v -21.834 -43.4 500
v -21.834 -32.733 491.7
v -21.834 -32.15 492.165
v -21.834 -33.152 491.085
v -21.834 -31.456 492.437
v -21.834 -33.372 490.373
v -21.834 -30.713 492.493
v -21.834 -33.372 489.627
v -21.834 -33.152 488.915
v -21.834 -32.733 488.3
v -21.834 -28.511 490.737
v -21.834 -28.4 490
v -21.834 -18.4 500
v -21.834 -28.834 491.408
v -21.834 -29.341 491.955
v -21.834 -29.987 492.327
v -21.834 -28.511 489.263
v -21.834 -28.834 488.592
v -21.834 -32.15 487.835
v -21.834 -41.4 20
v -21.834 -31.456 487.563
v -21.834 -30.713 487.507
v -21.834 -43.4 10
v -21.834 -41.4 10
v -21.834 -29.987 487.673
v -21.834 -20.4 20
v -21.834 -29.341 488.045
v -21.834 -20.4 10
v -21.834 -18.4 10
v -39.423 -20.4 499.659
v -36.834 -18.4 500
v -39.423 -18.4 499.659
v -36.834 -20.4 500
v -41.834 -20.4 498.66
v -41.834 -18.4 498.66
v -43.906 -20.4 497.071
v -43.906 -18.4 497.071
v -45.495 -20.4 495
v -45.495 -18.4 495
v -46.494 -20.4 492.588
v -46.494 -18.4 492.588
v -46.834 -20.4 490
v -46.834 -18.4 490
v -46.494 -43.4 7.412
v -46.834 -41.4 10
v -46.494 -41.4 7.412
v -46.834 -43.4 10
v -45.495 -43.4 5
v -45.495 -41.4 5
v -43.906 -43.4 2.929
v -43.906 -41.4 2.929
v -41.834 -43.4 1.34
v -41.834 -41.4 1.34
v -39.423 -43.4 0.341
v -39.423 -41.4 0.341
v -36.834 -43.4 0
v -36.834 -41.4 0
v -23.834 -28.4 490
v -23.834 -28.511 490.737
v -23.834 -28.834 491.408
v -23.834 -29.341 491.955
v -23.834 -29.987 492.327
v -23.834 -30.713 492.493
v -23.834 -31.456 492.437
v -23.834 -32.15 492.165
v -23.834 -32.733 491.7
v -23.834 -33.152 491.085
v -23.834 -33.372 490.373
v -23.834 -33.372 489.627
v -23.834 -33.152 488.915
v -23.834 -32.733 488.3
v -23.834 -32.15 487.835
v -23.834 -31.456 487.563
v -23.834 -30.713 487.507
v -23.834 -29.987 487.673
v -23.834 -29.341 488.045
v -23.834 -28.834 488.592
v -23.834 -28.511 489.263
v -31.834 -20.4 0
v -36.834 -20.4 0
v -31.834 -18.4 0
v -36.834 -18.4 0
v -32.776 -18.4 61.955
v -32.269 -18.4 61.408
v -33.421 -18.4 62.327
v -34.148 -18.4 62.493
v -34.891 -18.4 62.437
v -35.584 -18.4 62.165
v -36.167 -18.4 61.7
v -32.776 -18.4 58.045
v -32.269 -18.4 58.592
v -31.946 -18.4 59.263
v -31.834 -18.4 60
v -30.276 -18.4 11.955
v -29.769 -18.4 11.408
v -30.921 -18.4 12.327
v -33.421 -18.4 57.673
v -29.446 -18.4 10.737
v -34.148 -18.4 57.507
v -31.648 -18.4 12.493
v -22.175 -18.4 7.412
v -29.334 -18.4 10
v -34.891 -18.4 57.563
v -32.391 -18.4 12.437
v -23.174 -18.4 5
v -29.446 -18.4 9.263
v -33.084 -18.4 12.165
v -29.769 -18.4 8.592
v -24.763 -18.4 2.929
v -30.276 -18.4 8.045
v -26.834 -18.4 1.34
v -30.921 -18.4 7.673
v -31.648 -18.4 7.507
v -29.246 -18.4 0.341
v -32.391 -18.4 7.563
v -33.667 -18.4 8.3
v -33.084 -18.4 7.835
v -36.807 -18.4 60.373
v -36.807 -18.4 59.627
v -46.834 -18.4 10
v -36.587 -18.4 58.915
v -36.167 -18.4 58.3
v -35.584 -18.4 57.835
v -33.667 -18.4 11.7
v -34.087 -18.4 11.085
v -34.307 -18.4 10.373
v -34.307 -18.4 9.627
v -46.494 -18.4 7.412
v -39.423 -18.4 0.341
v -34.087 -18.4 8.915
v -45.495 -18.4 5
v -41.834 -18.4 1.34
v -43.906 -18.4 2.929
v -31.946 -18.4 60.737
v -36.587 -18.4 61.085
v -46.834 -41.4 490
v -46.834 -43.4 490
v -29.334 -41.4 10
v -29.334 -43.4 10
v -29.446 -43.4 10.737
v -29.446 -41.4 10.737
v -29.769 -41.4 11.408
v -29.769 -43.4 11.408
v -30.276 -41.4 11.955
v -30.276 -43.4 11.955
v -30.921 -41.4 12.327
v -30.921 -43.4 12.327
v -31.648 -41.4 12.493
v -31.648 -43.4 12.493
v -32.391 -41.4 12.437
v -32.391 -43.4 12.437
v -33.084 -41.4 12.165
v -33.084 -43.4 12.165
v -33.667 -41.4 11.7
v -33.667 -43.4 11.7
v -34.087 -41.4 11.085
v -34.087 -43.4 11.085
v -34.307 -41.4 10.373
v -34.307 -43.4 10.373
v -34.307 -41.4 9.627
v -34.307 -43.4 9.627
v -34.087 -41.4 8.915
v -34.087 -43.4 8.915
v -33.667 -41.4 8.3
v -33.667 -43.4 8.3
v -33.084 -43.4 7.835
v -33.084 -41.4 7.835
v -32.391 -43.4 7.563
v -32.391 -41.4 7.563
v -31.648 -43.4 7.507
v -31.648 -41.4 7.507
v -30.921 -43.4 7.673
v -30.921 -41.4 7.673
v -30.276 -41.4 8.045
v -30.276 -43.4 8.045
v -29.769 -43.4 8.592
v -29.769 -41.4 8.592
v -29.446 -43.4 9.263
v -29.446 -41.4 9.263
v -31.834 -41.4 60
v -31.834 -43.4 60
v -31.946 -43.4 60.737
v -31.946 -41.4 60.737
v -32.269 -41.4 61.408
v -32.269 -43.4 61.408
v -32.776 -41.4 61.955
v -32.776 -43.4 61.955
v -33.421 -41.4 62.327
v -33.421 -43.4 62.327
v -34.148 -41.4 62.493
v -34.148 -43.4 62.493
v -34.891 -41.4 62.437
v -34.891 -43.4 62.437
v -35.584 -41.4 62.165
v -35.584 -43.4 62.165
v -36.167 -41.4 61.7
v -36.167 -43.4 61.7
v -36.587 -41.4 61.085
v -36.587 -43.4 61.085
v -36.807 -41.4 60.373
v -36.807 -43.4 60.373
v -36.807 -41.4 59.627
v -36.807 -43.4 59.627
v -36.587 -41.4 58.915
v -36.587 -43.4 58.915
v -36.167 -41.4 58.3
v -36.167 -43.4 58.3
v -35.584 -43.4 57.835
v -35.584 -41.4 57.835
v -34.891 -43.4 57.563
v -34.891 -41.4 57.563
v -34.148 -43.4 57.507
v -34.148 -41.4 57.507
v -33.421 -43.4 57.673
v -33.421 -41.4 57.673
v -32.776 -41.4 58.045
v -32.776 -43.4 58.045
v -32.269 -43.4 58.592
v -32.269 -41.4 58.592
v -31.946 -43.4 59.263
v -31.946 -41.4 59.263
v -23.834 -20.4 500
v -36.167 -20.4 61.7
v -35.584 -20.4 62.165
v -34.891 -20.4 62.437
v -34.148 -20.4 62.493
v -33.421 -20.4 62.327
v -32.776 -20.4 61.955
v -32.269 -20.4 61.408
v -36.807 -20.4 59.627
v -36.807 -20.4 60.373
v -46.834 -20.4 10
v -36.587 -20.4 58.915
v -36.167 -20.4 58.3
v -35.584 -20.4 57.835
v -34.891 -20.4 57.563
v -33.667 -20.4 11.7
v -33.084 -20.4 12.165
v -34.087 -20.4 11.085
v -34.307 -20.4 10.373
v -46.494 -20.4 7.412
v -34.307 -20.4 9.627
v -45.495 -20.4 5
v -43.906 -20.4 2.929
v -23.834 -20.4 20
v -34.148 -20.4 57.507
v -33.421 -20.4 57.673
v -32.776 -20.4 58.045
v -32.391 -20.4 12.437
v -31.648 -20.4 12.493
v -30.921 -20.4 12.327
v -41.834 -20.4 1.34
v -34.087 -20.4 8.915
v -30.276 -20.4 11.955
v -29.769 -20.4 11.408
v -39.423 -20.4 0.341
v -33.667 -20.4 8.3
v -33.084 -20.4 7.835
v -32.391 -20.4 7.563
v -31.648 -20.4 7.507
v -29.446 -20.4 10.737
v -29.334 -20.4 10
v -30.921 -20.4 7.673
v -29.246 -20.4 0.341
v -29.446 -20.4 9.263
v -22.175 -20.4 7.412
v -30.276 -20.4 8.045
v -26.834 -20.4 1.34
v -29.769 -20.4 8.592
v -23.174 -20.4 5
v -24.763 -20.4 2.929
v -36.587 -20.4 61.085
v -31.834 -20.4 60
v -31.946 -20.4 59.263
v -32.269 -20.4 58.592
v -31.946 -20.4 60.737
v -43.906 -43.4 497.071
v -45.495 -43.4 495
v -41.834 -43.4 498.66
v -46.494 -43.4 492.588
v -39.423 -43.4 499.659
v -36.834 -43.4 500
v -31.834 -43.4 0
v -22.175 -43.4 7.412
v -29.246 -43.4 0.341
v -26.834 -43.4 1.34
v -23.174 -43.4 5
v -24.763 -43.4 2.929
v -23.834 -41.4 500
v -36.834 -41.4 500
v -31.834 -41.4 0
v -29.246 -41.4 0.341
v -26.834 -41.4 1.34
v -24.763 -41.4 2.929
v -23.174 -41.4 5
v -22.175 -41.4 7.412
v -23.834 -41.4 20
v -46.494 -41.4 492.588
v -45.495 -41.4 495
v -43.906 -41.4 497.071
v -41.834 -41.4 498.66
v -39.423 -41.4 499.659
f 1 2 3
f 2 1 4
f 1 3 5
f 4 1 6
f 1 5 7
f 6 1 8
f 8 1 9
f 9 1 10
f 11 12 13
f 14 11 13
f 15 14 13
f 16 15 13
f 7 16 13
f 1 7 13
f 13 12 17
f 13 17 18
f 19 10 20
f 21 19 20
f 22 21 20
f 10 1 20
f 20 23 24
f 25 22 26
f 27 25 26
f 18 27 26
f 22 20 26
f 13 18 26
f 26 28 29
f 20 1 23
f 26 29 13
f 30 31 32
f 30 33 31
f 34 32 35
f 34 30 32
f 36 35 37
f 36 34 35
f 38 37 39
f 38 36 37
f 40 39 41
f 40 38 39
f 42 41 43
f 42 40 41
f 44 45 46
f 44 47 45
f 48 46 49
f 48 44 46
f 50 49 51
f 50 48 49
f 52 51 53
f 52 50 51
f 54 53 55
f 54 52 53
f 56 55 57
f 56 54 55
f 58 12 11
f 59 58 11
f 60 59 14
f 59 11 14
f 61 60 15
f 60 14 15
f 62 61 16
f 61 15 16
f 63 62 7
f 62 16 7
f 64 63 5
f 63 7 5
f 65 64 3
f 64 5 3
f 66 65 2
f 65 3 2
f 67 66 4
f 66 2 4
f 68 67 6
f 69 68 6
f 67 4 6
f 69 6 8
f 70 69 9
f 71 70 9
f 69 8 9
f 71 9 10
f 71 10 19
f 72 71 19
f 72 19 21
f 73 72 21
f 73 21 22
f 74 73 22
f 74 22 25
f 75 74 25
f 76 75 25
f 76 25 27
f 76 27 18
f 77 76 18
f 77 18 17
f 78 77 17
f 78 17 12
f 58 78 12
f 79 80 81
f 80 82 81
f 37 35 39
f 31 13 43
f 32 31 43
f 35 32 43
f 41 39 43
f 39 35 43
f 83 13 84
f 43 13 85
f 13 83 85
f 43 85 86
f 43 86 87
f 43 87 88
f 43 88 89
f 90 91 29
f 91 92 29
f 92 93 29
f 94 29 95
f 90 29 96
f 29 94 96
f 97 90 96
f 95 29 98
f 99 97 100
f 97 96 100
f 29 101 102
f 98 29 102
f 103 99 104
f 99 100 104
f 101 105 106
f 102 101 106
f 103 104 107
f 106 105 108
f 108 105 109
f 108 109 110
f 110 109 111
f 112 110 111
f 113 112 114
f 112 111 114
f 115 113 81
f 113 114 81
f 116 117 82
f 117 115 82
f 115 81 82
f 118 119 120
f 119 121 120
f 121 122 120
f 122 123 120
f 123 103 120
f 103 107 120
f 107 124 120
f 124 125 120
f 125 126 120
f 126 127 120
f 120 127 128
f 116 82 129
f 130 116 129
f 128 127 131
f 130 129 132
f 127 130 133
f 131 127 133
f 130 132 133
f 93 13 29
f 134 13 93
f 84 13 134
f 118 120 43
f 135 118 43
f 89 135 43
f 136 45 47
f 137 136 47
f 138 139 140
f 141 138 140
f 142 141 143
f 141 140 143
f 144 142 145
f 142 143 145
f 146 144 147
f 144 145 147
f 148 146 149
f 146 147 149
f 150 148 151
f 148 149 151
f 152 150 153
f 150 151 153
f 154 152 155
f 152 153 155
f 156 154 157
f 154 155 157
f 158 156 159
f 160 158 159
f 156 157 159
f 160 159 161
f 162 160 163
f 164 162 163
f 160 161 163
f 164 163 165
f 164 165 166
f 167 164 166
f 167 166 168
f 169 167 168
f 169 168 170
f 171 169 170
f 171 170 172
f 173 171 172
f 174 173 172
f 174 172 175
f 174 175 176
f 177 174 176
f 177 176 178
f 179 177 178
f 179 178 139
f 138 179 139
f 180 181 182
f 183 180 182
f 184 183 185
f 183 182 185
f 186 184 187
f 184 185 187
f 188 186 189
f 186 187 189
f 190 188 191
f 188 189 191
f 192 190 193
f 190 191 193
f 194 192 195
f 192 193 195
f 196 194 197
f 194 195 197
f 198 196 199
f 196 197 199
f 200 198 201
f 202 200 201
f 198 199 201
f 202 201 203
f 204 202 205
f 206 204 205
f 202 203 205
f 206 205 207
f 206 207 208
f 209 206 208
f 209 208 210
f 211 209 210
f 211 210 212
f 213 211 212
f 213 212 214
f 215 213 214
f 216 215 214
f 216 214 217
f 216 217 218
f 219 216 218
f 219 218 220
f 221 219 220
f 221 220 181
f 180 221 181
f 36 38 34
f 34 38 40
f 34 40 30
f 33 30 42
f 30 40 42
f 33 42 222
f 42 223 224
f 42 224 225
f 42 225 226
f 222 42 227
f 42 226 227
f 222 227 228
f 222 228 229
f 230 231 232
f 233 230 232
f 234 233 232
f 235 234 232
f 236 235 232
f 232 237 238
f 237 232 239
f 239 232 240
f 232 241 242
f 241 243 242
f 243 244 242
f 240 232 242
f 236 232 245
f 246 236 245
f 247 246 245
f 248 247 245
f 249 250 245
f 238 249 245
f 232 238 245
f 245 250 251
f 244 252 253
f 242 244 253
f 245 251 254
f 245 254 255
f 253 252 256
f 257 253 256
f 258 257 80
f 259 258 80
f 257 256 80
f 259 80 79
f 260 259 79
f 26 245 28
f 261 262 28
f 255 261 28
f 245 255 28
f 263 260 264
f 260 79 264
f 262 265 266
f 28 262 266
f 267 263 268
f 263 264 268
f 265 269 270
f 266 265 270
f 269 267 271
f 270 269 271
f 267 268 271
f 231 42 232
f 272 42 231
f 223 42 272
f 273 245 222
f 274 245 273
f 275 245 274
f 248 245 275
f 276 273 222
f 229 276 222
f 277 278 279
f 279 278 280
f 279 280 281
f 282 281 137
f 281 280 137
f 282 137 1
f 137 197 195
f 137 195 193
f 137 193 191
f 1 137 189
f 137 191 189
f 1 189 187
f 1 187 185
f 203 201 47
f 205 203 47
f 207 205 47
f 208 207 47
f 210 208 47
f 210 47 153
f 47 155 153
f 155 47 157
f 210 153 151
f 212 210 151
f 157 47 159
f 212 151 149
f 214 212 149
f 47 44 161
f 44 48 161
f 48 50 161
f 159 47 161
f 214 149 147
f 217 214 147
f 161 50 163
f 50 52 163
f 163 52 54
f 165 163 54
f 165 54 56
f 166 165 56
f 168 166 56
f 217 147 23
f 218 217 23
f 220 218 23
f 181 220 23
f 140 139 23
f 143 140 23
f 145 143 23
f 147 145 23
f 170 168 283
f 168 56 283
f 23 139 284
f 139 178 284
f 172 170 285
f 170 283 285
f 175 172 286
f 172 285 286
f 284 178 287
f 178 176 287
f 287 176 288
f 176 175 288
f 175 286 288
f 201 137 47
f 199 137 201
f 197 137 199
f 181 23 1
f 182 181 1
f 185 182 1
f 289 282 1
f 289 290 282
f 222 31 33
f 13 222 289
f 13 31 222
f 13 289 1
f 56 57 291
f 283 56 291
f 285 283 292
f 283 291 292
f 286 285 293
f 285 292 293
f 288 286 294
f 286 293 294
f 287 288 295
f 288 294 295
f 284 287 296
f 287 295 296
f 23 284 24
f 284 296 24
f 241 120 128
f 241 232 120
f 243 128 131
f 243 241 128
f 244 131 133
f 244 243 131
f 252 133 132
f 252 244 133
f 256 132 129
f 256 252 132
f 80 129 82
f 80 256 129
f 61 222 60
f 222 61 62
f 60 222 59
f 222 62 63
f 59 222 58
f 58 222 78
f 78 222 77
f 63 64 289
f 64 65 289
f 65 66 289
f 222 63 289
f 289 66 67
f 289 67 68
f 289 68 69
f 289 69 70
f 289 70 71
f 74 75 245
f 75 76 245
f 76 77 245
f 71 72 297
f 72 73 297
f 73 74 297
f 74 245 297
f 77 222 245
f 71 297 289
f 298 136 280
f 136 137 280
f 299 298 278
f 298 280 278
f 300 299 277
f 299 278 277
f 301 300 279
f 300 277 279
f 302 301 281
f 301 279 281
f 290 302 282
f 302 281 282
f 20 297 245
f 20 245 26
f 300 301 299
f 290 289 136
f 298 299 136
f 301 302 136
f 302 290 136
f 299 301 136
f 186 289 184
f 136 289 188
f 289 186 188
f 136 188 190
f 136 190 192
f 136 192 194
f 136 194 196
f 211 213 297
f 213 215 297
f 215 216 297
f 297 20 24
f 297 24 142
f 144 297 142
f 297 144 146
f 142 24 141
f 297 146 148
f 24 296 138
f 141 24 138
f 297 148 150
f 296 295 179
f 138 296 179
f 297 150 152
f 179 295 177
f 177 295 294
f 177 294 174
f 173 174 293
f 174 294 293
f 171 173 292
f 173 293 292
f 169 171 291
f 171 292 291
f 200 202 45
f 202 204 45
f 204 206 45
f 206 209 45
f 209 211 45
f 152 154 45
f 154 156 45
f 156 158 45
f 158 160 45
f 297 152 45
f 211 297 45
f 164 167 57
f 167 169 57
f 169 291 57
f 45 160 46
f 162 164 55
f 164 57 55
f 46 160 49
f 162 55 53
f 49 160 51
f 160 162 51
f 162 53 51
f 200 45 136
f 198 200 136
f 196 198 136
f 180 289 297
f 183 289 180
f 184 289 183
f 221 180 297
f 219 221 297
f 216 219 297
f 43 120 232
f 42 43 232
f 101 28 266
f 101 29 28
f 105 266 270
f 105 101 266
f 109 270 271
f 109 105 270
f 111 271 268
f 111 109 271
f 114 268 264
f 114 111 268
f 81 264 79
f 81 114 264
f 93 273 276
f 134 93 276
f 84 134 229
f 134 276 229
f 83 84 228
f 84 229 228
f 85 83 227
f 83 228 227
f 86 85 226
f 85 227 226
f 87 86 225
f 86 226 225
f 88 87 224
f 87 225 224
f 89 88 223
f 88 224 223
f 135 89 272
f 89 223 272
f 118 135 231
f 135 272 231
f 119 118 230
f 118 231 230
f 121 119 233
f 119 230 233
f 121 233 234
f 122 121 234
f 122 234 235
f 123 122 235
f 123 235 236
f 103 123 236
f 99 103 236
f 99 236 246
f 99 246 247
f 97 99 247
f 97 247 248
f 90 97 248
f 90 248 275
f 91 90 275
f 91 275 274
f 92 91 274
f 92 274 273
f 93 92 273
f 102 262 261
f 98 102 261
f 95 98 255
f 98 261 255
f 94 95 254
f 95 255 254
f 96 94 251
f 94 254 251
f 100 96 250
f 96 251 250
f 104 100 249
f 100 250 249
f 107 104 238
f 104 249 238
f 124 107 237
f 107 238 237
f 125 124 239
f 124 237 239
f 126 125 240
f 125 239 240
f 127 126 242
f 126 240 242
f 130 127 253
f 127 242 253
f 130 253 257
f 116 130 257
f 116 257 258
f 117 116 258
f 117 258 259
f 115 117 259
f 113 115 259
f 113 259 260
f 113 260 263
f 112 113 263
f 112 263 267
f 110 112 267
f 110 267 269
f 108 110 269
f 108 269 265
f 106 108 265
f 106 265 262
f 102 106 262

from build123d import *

# Parameters (mm, degrees)
F1_DEPTH  = 500
F2_W      = 2
F2_H      = 21
F3_DEPTH  = 20
F4_R      = 2.5
F5_DEPTH  = 25
F6_R      = 10
F7_R      = 2.5
F8_DEPTH  = 25
F9_R      = 2.5
F10_DEPTH = 25


with BuildPart() as f1:
    # F0 (on Top) → F1 (new body)
    with BuildSketch(Plane.XY):
        Polygon((-46.834455, -41.400001), (-46.834455, -43.400001), (-21.834455, -43.400001), (-21.834455, -18.400001), (-46.834455, -18.400001), (-46.834455, -20.400001), (-23.834455, -20.400001), (-23.834455, -41.400001), align=None)
    extrude(amount=F1_DEPTH)

    # F2 (on face) → F3 (cut)
    with BuildSketch(Plane(origin=(0, 0, 0), x_dir=(1, 0, 0), z_dir=(0, 0, -1))):
        with Locations((-22.834455, 30.900001)):
            Rectangle(F2_W, F2_H)
    extrude(amount=-F3_DEPTH, mode=Mode.SUBTRACT)

    # F4 (on face) → F5 (cut)
    with BuildSketch(Plane.XZ.offset(43.400001)):
        with Locations((-31.834455, 10)):
            Circle(F4_R)
    extrude(amount=-F5_DEPTH, mode=Mode.SUBTRACT)

    # F6
    f6_edges = [f1.edges().sort_by_distance(p)[0] for p in [
        (-46.834455, -19.400001, 0),
        (-46.834455, -42.400001, 0),
        (-46.834455, -42.400001, 500),
        (-46.834455, -19.400001, 500),
        (-21.834455, -42.400001, 0),
        (-21.834455, -19.400001, 0),
    ]]
    fillet(f6_edges, radius=F6_R)

    # F7 (on face) → F8 (cut)
    with BuildSketch(Plane.YZ.offset(-21.834455)):
        with Locations((-30.900001, 490)):
            Circle(F7_R)
    extrude(amount=-F8_DEPTH, mode=Mode.SUBTRACT)

    # F9 (on face) → F10 (cut)
    with BuildSketch(Plane.XZ.offset(43.400001)):
        with Locations((-34.334455, 60)):
            Circle(F9_R)
    extrude(amount=-F10_DEPTH, mode=Mode.SUBTRACT)


solid = f1.part
